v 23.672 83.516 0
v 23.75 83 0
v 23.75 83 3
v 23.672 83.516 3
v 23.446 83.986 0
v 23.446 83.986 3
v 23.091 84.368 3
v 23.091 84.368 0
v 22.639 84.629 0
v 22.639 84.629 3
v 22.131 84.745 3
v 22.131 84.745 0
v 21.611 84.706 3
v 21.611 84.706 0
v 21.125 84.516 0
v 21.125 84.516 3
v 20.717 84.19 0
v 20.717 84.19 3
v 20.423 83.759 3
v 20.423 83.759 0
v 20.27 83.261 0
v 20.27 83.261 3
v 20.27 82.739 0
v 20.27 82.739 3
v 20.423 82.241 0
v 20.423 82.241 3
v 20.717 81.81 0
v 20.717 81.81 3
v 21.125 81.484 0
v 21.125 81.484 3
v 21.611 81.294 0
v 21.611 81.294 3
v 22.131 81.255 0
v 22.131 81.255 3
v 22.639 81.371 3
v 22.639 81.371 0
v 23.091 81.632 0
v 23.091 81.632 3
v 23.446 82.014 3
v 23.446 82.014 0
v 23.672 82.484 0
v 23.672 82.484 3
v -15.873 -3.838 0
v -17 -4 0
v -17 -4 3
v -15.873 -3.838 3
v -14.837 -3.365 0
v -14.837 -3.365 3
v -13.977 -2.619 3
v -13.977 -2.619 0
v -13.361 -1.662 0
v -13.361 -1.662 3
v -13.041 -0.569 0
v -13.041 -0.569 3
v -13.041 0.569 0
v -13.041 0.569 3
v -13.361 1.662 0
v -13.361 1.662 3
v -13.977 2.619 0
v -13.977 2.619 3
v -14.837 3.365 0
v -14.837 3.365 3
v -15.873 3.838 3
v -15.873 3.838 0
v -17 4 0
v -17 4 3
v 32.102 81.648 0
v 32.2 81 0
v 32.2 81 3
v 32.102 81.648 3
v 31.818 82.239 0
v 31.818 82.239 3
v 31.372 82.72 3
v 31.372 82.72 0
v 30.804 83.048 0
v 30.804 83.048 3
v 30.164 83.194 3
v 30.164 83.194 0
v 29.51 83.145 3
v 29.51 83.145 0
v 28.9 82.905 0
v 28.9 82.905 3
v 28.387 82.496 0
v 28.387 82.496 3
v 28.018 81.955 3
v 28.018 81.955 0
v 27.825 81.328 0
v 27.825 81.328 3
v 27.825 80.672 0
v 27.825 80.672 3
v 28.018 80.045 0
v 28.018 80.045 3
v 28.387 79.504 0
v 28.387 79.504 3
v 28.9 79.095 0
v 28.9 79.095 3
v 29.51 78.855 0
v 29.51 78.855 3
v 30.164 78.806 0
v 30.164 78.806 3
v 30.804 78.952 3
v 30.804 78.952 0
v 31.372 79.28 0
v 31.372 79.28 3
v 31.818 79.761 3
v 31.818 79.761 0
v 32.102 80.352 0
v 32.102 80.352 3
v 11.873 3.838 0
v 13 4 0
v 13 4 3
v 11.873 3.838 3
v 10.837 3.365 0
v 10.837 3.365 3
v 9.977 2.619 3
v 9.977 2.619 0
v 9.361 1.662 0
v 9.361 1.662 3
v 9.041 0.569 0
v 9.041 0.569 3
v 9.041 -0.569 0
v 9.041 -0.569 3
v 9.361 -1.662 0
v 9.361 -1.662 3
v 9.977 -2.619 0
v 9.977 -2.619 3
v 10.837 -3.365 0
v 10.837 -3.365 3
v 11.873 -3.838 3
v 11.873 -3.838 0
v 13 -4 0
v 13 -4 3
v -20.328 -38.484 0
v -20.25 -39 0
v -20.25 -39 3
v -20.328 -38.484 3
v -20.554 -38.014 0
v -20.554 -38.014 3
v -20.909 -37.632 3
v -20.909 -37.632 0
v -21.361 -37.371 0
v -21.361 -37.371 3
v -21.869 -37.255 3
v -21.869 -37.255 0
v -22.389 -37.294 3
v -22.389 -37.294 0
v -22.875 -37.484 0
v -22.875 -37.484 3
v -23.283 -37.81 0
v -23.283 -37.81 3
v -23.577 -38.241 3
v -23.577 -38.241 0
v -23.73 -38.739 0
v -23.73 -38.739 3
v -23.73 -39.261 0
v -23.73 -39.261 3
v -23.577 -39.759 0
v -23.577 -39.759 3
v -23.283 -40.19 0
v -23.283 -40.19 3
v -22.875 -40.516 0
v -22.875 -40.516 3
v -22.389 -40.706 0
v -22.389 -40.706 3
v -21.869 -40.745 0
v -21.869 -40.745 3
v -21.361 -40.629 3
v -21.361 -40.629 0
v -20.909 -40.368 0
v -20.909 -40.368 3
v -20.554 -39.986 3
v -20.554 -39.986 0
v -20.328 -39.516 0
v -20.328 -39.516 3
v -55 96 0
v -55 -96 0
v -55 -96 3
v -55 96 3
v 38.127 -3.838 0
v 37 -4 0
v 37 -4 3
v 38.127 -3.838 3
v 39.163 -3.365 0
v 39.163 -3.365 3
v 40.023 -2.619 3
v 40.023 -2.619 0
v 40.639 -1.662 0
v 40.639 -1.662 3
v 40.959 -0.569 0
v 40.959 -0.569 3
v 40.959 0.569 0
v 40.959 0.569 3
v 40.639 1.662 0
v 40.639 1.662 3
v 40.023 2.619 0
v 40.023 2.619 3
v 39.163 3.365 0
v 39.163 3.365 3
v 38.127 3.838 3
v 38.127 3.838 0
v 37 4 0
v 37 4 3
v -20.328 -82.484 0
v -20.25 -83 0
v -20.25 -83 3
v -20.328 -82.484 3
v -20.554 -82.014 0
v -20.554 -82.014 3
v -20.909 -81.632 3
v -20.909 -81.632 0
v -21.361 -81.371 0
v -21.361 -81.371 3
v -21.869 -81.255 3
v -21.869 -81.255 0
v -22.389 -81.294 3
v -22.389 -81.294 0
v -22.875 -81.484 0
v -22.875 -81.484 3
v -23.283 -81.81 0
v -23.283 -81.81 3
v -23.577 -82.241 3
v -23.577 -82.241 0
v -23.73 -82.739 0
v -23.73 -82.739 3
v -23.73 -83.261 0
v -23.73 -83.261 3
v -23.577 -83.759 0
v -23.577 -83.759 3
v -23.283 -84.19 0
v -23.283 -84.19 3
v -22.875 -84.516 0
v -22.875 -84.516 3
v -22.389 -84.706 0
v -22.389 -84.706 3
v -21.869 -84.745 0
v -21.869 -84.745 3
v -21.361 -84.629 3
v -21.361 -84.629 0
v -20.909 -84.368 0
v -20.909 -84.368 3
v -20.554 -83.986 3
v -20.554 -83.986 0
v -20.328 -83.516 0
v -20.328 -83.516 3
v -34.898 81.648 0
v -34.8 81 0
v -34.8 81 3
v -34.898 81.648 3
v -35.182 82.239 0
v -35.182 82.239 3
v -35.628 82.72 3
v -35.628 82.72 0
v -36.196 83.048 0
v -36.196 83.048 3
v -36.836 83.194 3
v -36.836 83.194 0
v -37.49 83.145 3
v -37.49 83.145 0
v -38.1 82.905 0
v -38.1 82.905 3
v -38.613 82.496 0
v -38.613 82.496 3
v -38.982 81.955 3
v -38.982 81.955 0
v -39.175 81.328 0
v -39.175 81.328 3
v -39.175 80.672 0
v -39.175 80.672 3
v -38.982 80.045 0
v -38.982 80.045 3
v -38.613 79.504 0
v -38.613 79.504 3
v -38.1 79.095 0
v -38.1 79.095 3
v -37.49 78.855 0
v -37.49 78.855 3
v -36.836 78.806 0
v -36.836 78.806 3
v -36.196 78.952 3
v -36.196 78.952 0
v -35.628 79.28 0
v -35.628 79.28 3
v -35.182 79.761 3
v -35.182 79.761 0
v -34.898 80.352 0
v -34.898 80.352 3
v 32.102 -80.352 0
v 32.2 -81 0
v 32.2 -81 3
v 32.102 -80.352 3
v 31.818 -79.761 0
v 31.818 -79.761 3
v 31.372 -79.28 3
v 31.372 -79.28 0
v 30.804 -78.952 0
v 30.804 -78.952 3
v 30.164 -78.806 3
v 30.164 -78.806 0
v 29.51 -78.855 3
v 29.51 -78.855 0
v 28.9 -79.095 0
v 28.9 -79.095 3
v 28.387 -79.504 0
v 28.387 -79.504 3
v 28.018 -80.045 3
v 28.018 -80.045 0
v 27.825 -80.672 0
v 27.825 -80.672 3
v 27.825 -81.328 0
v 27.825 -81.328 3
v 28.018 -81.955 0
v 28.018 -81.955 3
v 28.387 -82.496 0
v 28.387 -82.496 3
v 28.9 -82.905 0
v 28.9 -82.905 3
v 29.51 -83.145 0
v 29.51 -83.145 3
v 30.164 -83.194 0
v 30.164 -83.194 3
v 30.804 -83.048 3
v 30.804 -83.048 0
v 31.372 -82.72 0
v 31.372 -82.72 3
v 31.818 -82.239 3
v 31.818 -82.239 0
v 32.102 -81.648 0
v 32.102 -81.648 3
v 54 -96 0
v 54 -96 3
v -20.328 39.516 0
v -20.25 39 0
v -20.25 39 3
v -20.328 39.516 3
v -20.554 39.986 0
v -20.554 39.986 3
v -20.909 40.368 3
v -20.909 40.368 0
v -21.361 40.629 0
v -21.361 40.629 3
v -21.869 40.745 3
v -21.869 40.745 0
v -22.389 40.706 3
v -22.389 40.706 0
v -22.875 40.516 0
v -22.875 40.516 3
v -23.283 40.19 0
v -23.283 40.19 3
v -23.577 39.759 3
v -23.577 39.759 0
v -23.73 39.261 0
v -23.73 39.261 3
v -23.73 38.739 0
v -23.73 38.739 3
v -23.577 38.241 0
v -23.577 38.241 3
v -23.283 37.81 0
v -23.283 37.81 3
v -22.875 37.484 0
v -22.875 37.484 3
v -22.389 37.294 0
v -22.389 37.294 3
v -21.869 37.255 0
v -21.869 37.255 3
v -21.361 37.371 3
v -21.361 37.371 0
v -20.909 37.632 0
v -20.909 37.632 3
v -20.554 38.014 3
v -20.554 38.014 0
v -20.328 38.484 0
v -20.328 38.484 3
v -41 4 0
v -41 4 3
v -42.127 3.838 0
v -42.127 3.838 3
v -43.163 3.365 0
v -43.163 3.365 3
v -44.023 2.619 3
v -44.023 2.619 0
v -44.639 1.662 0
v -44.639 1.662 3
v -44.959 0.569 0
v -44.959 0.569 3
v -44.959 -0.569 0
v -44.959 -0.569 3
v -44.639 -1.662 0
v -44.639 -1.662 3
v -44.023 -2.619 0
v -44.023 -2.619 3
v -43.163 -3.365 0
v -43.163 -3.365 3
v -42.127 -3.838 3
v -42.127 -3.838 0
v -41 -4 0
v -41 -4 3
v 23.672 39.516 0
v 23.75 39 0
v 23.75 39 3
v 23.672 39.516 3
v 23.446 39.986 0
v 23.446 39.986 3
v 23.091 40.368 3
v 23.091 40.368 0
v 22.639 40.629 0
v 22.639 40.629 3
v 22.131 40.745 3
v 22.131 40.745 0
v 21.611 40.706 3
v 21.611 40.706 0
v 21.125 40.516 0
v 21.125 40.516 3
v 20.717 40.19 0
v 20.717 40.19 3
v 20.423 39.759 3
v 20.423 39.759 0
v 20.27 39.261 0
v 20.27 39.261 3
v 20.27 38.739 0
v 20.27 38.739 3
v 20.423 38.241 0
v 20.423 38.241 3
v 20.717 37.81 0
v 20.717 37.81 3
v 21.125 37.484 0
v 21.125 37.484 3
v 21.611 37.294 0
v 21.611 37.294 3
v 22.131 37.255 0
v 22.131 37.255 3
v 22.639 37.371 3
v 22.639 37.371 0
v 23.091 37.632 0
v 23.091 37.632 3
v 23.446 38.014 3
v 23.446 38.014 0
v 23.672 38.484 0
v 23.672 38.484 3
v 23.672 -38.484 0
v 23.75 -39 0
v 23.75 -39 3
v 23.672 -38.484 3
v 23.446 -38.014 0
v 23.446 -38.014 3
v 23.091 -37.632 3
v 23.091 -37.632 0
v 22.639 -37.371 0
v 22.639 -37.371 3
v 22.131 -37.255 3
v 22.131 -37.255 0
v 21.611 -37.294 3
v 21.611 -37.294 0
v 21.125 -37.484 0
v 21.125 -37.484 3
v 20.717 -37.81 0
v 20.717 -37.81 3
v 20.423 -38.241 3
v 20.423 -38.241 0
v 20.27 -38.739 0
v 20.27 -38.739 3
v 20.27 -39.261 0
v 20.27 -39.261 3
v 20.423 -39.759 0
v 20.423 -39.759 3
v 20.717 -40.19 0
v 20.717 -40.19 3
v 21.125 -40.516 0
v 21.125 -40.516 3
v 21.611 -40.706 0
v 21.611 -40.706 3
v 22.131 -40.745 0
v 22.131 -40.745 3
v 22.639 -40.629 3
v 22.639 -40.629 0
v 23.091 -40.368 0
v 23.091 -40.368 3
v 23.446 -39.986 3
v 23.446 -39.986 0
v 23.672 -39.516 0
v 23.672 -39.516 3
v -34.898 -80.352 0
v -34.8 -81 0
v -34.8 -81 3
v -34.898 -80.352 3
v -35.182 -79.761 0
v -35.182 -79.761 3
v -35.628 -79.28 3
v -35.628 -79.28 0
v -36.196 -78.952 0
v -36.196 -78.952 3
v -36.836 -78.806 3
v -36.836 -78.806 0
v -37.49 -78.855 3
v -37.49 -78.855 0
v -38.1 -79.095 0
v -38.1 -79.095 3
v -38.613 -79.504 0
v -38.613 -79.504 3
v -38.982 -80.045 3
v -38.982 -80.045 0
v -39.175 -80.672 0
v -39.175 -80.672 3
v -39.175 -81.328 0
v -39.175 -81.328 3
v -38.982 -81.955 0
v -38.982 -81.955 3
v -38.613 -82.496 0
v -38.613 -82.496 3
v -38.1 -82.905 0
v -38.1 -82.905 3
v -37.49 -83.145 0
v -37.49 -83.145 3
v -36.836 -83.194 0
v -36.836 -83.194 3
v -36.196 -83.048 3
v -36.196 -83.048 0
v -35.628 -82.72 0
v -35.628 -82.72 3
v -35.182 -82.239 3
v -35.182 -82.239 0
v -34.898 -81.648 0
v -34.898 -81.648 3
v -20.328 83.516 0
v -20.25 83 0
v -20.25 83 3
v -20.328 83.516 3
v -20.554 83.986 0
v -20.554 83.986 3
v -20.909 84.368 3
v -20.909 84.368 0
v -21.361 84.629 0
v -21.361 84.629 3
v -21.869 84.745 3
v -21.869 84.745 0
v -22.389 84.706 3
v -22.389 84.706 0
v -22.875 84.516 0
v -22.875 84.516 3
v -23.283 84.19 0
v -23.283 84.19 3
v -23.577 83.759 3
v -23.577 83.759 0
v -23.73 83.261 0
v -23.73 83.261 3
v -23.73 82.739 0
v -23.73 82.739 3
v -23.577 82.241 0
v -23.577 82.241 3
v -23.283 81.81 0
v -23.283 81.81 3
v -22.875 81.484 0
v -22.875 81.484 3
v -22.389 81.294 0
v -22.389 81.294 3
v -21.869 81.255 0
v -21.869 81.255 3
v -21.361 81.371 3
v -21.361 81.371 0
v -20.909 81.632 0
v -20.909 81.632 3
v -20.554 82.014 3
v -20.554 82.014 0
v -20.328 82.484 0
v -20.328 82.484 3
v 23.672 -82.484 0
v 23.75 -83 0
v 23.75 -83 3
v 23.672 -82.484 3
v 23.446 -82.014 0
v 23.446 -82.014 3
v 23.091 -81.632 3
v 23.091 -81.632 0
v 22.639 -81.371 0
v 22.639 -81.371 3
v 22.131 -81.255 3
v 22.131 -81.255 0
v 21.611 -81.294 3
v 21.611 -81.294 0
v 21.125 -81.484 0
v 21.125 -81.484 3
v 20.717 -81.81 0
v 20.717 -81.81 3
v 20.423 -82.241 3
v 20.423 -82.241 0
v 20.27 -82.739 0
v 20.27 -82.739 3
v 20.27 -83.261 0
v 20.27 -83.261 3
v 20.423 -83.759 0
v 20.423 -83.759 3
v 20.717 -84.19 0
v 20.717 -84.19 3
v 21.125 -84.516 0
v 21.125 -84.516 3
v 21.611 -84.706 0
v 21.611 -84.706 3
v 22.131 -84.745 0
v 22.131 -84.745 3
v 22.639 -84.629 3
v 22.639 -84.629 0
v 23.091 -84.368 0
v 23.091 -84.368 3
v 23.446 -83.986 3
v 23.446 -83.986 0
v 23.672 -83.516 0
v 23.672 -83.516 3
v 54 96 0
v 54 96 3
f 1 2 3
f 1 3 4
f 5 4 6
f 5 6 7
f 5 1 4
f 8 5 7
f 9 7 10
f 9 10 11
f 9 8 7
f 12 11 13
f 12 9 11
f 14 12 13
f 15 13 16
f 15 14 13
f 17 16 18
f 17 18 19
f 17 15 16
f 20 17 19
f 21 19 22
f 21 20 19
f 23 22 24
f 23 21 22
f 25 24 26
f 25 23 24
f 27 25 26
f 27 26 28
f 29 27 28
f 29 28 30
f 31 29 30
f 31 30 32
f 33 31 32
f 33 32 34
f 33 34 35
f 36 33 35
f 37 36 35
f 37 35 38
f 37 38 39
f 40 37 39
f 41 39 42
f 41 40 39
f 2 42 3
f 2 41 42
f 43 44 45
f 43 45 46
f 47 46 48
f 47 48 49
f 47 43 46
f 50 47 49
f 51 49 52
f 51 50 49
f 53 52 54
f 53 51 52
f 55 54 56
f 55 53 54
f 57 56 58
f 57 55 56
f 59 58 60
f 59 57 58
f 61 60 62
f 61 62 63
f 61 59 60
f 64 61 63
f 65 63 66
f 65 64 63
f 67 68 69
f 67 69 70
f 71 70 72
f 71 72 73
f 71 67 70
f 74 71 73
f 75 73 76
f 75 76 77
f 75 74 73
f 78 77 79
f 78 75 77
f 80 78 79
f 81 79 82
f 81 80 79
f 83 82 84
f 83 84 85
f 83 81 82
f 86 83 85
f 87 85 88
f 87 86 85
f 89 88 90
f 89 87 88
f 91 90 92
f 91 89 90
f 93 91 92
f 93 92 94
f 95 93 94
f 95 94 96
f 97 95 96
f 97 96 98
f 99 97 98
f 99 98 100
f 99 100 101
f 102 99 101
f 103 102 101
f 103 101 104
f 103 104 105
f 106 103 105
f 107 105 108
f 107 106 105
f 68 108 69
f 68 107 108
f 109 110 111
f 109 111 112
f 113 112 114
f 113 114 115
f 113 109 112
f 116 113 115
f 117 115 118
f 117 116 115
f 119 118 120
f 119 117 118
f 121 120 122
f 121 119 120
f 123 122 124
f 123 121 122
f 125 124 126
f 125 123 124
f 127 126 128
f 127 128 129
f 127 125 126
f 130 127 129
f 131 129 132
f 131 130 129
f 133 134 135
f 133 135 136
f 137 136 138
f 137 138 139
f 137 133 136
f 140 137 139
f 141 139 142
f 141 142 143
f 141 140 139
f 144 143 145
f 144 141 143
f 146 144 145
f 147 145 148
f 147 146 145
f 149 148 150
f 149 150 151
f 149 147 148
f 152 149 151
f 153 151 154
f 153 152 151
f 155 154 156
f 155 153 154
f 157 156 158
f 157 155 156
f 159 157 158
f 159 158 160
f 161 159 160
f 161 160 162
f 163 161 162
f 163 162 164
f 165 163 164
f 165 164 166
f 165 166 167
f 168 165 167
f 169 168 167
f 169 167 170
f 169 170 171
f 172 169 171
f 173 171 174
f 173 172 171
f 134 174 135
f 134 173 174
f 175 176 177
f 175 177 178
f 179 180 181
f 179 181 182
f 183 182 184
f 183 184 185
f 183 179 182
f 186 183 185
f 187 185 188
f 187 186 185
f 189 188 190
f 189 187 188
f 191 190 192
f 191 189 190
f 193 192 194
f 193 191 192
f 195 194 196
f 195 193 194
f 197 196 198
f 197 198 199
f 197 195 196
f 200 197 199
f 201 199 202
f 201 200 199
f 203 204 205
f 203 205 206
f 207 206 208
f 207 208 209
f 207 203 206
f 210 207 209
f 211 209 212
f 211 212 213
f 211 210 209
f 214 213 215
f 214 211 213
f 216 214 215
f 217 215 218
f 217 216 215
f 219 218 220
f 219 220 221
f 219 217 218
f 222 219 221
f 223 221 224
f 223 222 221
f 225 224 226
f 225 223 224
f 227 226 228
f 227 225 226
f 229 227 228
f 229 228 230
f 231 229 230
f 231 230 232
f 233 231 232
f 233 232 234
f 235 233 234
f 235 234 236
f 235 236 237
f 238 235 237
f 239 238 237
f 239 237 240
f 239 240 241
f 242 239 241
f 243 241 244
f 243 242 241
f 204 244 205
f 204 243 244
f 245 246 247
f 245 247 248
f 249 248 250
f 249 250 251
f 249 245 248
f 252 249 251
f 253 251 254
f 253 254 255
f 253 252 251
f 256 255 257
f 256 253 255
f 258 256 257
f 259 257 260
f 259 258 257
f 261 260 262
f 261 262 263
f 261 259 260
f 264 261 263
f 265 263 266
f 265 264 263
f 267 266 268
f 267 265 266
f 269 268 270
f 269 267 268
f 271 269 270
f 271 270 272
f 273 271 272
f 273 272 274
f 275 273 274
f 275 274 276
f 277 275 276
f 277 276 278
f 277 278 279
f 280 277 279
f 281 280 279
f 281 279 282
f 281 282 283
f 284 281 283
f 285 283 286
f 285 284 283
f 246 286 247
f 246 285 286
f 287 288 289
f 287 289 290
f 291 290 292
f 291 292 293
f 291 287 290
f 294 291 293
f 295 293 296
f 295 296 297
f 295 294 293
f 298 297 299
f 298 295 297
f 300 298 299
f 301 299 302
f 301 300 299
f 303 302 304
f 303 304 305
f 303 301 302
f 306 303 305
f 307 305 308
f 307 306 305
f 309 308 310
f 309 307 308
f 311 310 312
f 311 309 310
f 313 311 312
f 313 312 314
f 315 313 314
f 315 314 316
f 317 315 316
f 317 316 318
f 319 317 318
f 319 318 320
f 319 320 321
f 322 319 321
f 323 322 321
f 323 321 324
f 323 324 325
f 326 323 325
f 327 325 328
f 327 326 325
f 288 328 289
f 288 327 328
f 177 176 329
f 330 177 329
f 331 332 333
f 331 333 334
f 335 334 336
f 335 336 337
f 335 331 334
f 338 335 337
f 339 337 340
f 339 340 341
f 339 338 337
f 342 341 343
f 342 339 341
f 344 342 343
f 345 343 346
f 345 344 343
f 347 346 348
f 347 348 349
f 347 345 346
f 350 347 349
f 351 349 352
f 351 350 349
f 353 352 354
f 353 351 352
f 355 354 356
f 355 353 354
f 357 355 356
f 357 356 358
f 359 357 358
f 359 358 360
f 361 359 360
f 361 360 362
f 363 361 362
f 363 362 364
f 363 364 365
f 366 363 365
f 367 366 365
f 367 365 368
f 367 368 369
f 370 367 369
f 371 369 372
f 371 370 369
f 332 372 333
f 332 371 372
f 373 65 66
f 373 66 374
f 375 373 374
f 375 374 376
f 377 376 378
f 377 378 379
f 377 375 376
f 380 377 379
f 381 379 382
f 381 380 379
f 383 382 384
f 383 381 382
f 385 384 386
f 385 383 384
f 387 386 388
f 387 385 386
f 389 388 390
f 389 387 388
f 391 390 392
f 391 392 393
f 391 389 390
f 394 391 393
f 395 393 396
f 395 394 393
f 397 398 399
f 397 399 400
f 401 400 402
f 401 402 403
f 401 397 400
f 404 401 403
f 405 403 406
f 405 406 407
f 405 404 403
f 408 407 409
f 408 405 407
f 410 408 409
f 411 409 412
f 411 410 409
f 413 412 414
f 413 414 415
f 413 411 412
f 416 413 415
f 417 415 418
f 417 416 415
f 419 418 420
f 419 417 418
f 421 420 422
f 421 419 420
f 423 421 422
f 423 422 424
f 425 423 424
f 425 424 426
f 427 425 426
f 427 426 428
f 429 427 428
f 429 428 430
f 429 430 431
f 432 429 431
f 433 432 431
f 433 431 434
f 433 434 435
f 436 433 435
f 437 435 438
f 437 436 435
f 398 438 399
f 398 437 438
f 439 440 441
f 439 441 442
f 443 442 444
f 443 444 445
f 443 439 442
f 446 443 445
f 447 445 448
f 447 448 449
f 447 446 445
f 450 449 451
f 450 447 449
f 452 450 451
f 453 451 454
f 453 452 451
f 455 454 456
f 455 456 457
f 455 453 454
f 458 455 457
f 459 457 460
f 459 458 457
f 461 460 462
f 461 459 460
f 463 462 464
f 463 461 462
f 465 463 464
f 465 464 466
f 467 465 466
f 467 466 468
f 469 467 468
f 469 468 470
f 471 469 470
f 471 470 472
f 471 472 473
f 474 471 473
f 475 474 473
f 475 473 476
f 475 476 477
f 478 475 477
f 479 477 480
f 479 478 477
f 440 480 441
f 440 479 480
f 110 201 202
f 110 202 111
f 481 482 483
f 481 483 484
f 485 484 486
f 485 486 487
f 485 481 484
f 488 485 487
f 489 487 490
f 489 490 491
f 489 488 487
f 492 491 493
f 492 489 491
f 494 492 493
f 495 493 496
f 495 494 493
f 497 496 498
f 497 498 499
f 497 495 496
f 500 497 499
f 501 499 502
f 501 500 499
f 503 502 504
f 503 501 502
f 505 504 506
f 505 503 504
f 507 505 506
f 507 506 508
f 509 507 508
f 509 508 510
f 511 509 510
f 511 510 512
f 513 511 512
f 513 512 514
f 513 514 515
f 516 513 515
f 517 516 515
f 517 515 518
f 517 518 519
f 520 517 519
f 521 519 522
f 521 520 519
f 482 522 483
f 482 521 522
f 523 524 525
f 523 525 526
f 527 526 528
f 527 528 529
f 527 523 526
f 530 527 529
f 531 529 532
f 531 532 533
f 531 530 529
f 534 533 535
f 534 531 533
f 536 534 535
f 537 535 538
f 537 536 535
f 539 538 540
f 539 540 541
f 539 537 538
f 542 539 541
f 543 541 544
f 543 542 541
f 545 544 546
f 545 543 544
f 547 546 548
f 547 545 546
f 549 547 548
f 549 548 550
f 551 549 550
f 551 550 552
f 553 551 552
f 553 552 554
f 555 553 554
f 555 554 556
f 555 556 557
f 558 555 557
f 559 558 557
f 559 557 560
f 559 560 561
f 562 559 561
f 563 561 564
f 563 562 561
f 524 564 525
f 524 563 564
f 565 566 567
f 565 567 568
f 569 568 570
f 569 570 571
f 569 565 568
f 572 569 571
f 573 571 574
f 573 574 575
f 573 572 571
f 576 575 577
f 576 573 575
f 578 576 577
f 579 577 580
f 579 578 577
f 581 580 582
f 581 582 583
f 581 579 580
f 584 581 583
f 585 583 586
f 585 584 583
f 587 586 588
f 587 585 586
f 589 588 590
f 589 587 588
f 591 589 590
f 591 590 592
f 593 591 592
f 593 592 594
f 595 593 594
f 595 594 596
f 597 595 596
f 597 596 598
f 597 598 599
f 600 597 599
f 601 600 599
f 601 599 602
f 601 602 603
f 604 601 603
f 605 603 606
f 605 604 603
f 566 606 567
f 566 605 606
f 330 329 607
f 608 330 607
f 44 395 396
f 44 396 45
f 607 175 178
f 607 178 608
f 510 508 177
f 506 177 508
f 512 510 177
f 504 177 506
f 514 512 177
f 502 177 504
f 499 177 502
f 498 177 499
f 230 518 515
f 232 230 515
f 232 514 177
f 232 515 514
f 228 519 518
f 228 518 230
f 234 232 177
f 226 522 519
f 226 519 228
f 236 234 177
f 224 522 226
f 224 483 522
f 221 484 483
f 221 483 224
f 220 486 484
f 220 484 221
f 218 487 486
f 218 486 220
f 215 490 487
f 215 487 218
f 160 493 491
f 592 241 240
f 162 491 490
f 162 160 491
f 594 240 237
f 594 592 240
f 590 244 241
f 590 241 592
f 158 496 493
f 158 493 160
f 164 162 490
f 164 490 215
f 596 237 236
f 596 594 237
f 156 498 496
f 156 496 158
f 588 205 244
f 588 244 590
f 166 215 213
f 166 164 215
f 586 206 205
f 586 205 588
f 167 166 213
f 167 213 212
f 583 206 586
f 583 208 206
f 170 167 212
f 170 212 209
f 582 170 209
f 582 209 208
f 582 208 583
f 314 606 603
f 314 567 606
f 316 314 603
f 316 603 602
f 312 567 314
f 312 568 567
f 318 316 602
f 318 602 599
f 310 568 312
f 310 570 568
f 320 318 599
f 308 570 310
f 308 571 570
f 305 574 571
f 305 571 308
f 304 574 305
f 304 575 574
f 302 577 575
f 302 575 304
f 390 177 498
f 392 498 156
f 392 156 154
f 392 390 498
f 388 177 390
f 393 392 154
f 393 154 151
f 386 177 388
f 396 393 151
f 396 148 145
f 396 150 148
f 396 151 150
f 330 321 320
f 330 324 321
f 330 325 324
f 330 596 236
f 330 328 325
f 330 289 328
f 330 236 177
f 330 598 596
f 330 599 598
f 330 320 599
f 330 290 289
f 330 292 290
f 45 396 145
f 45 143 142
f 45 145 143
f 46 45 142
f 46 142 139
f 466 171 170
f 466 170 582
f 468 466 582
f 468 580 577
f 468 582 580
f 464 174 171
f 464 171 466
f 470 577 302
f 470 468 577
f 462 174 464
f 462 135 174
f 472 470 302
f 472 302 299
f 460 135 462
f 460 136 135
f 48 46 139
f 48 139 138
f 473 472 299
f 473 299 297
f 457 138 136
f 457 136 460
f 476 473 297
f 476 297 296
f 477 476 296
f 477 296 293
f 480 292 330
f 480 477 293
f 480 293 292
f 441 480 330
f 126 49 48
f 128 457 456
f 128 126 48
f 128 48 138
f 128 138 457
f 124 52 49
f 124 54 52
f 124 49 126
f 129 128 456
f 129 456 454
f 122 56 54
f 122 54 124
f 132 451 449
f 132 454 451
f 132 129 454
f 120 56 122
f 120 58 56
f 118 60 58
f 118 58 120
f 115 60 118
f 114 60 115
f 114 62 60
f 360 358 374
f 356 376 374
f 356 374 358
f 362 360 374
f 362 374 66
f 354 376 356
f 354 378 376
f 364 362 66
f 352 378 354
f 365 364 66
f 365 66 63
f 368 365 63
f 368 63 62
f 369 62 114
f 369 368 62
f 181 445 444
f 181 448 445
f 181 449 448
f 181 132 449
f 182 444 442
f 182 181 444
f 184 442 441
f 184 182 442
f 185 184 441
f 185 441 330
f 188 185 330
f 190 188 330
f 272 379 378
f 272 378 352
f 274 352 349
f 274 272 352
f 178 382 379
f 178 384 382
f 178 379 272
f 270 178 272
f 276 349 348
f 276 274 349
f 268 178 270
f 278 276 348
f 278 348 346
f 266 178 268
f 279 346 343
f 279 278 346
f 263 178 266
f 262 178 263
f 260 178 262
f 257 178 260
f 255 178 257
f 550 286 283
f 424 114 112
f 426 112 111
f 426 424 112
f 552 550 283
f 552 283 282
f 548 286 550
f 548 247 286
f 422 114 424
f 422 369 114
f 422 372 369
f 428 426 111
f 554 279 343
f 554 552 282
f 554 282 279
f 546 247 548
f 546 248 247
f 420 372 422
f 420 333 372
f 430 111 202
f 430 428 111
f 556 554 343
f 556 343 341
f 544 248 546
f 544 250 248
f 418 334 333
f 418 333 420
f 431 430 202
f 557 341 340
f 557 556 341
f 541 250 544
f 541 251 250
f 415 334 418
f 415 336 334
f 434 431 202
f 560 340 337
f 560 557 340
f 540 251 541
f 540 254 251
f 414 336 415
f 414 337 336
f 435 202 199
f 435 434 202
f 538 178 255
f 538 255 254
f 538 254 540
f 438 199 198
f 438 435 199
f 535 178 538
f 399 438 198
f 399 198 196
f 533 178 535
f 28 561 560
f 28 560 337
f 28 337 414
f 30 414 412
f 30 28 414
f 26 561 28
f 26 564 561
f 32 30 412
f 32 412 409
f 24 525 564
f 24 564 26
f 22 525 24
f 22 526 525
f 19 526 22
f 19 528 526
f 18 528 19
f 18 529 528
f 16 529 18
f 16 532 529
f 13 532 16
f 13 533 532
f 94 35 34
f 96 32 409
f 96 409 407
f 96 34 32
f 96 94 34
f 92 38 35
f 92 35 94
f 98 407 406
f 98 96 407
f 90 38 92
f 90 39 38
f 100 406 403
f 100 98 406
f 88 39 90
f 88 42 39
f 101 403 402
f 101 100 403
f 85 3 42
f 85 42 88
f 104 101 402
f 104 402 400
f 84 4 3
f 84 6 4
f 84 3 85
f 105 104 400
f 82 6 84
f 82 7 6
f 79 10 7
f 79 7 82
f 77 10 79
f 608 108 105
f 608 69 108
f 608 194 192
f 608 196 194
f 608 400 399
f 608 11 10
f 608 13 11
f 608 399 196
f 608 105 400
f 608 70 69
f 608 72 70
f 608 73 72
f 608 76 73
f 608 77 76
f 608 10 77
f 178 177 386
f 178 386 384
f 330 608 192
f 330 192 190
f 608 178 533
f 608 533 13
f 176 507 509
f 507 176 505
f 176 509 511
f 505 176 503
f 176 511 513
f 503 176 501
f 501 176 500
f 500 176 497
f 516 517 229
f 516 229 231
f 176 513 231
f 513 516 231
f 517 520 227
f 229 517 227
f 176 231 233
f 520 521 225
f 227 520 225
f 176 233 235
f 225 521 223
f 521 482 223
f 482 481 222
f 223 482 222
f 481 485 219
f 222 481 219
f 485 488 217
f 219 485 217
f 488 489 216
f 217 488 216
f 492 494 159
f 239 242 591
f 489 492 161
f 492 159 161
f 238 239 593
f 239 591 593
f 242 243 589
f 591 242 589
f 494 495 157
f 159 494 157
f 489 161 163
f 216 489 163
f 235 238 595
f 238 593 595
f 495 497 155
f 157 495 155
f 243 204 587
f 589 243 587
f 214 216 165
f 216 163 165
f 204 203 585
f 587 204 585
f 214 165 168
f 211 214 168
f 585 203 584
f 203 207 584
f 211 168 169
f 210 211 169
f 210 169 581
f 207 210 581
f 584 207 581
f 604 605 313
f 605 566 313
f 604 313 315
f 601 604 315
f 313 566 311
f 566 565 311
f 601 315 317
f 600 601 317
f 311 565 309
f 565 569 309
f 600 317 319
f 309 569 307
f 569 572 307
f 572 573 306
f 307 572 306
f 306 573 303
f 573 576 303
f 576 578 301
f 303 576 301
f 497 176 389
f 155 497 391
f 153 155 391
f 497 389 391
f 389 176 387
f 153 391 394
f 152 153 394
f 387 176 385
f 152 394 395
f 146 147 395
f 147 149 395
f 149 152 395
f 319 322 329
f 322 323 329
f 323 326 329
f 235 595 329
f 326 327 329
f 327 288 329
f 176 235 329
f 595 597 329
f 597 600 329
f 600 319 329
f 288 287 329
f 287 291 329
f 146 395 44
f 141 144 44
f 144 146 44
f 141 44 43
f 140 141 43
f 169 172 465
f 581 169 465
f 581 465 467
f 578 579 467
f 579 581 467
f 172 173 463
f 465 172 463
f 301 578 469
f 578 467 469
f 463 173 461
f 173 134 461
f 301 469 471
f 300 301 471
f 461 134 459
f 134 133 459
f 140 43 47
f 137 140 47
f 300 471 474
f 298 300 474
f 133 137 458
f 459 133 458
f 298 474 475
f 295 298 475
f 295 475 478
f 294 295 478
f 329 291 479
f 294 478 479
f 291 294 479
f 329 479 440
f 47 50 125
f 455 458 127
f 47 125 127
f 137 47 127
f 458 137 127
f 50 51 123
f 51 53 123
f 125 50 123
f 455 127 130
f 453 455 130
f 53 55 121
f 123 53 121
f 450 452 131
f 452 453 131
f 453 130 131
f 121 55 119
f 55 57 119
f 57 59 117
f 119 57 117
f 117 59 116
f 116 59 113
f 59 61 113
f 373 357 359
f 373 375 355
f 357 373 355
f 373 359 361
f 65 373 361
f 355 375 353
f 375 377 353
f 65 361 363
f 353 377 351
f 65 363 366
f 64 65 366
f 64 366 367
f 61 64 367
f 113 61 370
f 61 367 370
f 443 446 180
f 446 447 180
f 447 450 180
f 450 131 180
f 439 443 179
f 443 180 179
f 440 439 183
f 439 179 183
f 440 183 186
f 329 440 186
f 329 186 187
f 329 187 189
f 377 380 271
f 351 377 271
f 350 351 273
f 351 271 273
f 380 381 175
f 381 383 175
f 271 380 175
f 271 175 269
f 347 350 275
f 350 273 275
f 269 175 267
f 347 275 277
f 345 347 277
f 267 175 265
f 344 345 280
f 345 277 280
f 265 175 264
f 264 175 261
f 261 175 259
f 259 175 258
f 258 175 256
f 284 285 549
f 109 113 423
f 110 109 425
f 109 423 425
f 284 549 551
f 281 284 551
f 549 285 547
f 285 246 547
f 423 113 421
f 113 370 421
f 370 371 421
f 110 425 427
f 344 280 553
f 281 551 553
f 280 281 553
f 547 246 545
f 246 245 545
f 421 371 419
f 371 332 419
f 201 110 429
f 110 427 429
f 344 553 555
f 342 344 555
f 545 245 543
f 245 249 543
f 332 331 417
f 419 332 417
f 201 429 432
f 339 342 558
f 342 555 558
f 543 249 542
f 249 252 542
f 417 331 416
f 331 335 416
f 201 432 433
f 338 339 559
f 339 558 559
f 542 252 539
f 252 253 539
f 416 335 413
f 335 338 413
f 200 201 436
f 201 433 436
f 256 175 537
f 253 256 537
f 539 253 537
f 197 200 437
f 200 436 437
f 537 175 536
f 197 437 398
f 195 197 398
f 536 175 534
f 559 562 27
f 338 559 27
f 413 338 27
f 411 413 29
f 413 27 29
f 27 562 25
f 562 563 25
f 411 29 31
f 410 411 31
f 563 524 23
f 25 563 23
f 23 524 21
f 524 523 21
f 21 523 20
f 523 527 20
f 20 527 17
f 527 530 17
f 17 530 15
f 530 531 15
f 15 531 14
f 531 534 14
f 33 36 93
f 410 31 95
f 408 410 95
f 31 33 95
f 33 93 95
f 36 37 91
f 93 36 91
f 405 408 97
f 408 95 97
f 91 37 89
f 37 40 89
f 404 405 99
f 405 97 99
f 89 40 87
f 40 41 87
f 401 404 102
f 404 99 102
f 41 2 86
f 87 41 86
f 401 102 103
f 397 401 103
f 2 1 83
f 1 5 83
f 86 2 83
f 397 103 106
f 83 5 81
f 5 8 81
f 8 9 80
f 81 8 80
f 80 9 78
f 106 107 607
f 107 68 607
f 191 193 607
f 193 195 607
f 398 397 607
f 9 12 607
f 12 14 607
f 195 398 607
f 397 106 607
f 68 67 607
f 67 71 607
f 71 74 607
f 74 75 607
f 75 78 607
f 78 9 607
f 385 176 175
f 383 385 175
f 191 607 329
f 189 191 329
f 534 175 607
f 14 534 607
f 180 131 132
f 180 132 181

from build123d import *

# Parameters (mm, degrees)
WIRING_SLOTS_AND_DECK_MOUNTS_PROFILE_W   = 109
WIRING_SLOTS_AND_DECK_MOUNTS_PROFILE_H   = 192
WIRING_SLOTS_AND_DECK_MOUNTS_PROFILE_R   = 2.2
WIRING_SLOTS_AND_DECK_MOUNTS_PROFILE_R_2 = 1.75
WIRING_SLOTS_AND_DECK_MOUNTS_DEPTH       = 3


with BuildPart() as part:
    # Wiring slots and deck mounts profile → Wiring slots and deck mounts (new body)
    with BuildSketch(Plane.XY):
        with Locations((-0.5, 0)):
            Rectangle(WIRING_SLOTS_AND_DECK_MOUNTS_PROFILE_W, WIRING_SLOTS_AND_DECK_MOUNTS_PROFILE_H)
        with Locations((-37, -81)):
            Circle(WIRING_SLOTS_AND_DECK_MOUNTS_PROFILE_R, mode=Mode.SUBTRACT)
        with Locations((-37, 81)):
            Circle(WIRING_SLOTS_AND_DECK_MOUNTS_PROFILE_R, mode=Mode.SUBTRACT)
        with Locations((30, -81)):
            Circle(WIRING_SLOTS_AND_DECK_MOUNTS_PROFILE_R, mode=Mode.SUBTRACT)
        with Locations((30, 81)):
            Circle(WIRING_SLOTS_AND_DECK_MOUNTS_PROFILE_R, mode=Mode.SUBTRACT)
        with Locations((-22, -83)):
            Circle(WIRING_SLOTS_AND_DECK_MOUNTS_PROFILE_R_2, mode=Mode.SUBTRACT)
        with Locations((-22, 39)):
            Circle(WIRING_SLOTS_AND_DECK_MOUNTS_PROFILE_R_2, mode=Mode.SUBTRACT)
        with Locations((-22, -39)):
            Circle(WIRING_SLOTS_AND_DECK_MOUNTS_PROFILE_R_2, mode=Mode.SUBTRACT)
        with Locations((-22, 83)):
            Circle(WIRING_SLOTS_AND_DECK_MOUNTS_PROFILE_R_2, mode=Mode.SUBTRACT)
        with Locations((22, -83)):
            Circle(WIRING_SLOTS_AND_DECK_MOUNTS_PROFILE_R_2, mode=Mode.SUBTRACT)
        with Locations((22, 39)):
            Circle(WIRING_SLOTS_AND_DECK_MOUNTS_PROFILE_R_2, mode=Mode.SUBTRACT)
        with Locations((22, -39)):
            Circle(WIRING_SLOTS_AND_DECK_MOUNTS_PROFILE_R_2, mode=Mode.SUBTRACT)
        with Locations((22, 83)):
            Circle(WIRING_SLOTS_AND_DECK_MOUNTS_PROFILE_R_2, mode=Mode.SUBTRACT)
        with BuildLine():
            Line((-41, -4), (-17, -4))
            ThreePointArc((-17, -4), (-13, 0), (-17, 4))
            Line((-17, 4), (-41, 4))
            ThreePointArc((-41, 4), (-45, 0), (-41, -4))
        make_face(mode=Mode.SUBTRACT)
        with BuildLine():
            Line((13, -4), (37, -4))
            ThreePointArc((37, -4), (41, 0), (37, 4))
            Line((37, 4), (13, 4))
            ThreePointArc((13, 4), (9, 0), (13, -4))
        make_face(mode=Mode.SUBTRACT)
    extrude(amount=WIRING_SLOTS_AND_DECK_MOUNTS_DEPTH)


solid = part.part
